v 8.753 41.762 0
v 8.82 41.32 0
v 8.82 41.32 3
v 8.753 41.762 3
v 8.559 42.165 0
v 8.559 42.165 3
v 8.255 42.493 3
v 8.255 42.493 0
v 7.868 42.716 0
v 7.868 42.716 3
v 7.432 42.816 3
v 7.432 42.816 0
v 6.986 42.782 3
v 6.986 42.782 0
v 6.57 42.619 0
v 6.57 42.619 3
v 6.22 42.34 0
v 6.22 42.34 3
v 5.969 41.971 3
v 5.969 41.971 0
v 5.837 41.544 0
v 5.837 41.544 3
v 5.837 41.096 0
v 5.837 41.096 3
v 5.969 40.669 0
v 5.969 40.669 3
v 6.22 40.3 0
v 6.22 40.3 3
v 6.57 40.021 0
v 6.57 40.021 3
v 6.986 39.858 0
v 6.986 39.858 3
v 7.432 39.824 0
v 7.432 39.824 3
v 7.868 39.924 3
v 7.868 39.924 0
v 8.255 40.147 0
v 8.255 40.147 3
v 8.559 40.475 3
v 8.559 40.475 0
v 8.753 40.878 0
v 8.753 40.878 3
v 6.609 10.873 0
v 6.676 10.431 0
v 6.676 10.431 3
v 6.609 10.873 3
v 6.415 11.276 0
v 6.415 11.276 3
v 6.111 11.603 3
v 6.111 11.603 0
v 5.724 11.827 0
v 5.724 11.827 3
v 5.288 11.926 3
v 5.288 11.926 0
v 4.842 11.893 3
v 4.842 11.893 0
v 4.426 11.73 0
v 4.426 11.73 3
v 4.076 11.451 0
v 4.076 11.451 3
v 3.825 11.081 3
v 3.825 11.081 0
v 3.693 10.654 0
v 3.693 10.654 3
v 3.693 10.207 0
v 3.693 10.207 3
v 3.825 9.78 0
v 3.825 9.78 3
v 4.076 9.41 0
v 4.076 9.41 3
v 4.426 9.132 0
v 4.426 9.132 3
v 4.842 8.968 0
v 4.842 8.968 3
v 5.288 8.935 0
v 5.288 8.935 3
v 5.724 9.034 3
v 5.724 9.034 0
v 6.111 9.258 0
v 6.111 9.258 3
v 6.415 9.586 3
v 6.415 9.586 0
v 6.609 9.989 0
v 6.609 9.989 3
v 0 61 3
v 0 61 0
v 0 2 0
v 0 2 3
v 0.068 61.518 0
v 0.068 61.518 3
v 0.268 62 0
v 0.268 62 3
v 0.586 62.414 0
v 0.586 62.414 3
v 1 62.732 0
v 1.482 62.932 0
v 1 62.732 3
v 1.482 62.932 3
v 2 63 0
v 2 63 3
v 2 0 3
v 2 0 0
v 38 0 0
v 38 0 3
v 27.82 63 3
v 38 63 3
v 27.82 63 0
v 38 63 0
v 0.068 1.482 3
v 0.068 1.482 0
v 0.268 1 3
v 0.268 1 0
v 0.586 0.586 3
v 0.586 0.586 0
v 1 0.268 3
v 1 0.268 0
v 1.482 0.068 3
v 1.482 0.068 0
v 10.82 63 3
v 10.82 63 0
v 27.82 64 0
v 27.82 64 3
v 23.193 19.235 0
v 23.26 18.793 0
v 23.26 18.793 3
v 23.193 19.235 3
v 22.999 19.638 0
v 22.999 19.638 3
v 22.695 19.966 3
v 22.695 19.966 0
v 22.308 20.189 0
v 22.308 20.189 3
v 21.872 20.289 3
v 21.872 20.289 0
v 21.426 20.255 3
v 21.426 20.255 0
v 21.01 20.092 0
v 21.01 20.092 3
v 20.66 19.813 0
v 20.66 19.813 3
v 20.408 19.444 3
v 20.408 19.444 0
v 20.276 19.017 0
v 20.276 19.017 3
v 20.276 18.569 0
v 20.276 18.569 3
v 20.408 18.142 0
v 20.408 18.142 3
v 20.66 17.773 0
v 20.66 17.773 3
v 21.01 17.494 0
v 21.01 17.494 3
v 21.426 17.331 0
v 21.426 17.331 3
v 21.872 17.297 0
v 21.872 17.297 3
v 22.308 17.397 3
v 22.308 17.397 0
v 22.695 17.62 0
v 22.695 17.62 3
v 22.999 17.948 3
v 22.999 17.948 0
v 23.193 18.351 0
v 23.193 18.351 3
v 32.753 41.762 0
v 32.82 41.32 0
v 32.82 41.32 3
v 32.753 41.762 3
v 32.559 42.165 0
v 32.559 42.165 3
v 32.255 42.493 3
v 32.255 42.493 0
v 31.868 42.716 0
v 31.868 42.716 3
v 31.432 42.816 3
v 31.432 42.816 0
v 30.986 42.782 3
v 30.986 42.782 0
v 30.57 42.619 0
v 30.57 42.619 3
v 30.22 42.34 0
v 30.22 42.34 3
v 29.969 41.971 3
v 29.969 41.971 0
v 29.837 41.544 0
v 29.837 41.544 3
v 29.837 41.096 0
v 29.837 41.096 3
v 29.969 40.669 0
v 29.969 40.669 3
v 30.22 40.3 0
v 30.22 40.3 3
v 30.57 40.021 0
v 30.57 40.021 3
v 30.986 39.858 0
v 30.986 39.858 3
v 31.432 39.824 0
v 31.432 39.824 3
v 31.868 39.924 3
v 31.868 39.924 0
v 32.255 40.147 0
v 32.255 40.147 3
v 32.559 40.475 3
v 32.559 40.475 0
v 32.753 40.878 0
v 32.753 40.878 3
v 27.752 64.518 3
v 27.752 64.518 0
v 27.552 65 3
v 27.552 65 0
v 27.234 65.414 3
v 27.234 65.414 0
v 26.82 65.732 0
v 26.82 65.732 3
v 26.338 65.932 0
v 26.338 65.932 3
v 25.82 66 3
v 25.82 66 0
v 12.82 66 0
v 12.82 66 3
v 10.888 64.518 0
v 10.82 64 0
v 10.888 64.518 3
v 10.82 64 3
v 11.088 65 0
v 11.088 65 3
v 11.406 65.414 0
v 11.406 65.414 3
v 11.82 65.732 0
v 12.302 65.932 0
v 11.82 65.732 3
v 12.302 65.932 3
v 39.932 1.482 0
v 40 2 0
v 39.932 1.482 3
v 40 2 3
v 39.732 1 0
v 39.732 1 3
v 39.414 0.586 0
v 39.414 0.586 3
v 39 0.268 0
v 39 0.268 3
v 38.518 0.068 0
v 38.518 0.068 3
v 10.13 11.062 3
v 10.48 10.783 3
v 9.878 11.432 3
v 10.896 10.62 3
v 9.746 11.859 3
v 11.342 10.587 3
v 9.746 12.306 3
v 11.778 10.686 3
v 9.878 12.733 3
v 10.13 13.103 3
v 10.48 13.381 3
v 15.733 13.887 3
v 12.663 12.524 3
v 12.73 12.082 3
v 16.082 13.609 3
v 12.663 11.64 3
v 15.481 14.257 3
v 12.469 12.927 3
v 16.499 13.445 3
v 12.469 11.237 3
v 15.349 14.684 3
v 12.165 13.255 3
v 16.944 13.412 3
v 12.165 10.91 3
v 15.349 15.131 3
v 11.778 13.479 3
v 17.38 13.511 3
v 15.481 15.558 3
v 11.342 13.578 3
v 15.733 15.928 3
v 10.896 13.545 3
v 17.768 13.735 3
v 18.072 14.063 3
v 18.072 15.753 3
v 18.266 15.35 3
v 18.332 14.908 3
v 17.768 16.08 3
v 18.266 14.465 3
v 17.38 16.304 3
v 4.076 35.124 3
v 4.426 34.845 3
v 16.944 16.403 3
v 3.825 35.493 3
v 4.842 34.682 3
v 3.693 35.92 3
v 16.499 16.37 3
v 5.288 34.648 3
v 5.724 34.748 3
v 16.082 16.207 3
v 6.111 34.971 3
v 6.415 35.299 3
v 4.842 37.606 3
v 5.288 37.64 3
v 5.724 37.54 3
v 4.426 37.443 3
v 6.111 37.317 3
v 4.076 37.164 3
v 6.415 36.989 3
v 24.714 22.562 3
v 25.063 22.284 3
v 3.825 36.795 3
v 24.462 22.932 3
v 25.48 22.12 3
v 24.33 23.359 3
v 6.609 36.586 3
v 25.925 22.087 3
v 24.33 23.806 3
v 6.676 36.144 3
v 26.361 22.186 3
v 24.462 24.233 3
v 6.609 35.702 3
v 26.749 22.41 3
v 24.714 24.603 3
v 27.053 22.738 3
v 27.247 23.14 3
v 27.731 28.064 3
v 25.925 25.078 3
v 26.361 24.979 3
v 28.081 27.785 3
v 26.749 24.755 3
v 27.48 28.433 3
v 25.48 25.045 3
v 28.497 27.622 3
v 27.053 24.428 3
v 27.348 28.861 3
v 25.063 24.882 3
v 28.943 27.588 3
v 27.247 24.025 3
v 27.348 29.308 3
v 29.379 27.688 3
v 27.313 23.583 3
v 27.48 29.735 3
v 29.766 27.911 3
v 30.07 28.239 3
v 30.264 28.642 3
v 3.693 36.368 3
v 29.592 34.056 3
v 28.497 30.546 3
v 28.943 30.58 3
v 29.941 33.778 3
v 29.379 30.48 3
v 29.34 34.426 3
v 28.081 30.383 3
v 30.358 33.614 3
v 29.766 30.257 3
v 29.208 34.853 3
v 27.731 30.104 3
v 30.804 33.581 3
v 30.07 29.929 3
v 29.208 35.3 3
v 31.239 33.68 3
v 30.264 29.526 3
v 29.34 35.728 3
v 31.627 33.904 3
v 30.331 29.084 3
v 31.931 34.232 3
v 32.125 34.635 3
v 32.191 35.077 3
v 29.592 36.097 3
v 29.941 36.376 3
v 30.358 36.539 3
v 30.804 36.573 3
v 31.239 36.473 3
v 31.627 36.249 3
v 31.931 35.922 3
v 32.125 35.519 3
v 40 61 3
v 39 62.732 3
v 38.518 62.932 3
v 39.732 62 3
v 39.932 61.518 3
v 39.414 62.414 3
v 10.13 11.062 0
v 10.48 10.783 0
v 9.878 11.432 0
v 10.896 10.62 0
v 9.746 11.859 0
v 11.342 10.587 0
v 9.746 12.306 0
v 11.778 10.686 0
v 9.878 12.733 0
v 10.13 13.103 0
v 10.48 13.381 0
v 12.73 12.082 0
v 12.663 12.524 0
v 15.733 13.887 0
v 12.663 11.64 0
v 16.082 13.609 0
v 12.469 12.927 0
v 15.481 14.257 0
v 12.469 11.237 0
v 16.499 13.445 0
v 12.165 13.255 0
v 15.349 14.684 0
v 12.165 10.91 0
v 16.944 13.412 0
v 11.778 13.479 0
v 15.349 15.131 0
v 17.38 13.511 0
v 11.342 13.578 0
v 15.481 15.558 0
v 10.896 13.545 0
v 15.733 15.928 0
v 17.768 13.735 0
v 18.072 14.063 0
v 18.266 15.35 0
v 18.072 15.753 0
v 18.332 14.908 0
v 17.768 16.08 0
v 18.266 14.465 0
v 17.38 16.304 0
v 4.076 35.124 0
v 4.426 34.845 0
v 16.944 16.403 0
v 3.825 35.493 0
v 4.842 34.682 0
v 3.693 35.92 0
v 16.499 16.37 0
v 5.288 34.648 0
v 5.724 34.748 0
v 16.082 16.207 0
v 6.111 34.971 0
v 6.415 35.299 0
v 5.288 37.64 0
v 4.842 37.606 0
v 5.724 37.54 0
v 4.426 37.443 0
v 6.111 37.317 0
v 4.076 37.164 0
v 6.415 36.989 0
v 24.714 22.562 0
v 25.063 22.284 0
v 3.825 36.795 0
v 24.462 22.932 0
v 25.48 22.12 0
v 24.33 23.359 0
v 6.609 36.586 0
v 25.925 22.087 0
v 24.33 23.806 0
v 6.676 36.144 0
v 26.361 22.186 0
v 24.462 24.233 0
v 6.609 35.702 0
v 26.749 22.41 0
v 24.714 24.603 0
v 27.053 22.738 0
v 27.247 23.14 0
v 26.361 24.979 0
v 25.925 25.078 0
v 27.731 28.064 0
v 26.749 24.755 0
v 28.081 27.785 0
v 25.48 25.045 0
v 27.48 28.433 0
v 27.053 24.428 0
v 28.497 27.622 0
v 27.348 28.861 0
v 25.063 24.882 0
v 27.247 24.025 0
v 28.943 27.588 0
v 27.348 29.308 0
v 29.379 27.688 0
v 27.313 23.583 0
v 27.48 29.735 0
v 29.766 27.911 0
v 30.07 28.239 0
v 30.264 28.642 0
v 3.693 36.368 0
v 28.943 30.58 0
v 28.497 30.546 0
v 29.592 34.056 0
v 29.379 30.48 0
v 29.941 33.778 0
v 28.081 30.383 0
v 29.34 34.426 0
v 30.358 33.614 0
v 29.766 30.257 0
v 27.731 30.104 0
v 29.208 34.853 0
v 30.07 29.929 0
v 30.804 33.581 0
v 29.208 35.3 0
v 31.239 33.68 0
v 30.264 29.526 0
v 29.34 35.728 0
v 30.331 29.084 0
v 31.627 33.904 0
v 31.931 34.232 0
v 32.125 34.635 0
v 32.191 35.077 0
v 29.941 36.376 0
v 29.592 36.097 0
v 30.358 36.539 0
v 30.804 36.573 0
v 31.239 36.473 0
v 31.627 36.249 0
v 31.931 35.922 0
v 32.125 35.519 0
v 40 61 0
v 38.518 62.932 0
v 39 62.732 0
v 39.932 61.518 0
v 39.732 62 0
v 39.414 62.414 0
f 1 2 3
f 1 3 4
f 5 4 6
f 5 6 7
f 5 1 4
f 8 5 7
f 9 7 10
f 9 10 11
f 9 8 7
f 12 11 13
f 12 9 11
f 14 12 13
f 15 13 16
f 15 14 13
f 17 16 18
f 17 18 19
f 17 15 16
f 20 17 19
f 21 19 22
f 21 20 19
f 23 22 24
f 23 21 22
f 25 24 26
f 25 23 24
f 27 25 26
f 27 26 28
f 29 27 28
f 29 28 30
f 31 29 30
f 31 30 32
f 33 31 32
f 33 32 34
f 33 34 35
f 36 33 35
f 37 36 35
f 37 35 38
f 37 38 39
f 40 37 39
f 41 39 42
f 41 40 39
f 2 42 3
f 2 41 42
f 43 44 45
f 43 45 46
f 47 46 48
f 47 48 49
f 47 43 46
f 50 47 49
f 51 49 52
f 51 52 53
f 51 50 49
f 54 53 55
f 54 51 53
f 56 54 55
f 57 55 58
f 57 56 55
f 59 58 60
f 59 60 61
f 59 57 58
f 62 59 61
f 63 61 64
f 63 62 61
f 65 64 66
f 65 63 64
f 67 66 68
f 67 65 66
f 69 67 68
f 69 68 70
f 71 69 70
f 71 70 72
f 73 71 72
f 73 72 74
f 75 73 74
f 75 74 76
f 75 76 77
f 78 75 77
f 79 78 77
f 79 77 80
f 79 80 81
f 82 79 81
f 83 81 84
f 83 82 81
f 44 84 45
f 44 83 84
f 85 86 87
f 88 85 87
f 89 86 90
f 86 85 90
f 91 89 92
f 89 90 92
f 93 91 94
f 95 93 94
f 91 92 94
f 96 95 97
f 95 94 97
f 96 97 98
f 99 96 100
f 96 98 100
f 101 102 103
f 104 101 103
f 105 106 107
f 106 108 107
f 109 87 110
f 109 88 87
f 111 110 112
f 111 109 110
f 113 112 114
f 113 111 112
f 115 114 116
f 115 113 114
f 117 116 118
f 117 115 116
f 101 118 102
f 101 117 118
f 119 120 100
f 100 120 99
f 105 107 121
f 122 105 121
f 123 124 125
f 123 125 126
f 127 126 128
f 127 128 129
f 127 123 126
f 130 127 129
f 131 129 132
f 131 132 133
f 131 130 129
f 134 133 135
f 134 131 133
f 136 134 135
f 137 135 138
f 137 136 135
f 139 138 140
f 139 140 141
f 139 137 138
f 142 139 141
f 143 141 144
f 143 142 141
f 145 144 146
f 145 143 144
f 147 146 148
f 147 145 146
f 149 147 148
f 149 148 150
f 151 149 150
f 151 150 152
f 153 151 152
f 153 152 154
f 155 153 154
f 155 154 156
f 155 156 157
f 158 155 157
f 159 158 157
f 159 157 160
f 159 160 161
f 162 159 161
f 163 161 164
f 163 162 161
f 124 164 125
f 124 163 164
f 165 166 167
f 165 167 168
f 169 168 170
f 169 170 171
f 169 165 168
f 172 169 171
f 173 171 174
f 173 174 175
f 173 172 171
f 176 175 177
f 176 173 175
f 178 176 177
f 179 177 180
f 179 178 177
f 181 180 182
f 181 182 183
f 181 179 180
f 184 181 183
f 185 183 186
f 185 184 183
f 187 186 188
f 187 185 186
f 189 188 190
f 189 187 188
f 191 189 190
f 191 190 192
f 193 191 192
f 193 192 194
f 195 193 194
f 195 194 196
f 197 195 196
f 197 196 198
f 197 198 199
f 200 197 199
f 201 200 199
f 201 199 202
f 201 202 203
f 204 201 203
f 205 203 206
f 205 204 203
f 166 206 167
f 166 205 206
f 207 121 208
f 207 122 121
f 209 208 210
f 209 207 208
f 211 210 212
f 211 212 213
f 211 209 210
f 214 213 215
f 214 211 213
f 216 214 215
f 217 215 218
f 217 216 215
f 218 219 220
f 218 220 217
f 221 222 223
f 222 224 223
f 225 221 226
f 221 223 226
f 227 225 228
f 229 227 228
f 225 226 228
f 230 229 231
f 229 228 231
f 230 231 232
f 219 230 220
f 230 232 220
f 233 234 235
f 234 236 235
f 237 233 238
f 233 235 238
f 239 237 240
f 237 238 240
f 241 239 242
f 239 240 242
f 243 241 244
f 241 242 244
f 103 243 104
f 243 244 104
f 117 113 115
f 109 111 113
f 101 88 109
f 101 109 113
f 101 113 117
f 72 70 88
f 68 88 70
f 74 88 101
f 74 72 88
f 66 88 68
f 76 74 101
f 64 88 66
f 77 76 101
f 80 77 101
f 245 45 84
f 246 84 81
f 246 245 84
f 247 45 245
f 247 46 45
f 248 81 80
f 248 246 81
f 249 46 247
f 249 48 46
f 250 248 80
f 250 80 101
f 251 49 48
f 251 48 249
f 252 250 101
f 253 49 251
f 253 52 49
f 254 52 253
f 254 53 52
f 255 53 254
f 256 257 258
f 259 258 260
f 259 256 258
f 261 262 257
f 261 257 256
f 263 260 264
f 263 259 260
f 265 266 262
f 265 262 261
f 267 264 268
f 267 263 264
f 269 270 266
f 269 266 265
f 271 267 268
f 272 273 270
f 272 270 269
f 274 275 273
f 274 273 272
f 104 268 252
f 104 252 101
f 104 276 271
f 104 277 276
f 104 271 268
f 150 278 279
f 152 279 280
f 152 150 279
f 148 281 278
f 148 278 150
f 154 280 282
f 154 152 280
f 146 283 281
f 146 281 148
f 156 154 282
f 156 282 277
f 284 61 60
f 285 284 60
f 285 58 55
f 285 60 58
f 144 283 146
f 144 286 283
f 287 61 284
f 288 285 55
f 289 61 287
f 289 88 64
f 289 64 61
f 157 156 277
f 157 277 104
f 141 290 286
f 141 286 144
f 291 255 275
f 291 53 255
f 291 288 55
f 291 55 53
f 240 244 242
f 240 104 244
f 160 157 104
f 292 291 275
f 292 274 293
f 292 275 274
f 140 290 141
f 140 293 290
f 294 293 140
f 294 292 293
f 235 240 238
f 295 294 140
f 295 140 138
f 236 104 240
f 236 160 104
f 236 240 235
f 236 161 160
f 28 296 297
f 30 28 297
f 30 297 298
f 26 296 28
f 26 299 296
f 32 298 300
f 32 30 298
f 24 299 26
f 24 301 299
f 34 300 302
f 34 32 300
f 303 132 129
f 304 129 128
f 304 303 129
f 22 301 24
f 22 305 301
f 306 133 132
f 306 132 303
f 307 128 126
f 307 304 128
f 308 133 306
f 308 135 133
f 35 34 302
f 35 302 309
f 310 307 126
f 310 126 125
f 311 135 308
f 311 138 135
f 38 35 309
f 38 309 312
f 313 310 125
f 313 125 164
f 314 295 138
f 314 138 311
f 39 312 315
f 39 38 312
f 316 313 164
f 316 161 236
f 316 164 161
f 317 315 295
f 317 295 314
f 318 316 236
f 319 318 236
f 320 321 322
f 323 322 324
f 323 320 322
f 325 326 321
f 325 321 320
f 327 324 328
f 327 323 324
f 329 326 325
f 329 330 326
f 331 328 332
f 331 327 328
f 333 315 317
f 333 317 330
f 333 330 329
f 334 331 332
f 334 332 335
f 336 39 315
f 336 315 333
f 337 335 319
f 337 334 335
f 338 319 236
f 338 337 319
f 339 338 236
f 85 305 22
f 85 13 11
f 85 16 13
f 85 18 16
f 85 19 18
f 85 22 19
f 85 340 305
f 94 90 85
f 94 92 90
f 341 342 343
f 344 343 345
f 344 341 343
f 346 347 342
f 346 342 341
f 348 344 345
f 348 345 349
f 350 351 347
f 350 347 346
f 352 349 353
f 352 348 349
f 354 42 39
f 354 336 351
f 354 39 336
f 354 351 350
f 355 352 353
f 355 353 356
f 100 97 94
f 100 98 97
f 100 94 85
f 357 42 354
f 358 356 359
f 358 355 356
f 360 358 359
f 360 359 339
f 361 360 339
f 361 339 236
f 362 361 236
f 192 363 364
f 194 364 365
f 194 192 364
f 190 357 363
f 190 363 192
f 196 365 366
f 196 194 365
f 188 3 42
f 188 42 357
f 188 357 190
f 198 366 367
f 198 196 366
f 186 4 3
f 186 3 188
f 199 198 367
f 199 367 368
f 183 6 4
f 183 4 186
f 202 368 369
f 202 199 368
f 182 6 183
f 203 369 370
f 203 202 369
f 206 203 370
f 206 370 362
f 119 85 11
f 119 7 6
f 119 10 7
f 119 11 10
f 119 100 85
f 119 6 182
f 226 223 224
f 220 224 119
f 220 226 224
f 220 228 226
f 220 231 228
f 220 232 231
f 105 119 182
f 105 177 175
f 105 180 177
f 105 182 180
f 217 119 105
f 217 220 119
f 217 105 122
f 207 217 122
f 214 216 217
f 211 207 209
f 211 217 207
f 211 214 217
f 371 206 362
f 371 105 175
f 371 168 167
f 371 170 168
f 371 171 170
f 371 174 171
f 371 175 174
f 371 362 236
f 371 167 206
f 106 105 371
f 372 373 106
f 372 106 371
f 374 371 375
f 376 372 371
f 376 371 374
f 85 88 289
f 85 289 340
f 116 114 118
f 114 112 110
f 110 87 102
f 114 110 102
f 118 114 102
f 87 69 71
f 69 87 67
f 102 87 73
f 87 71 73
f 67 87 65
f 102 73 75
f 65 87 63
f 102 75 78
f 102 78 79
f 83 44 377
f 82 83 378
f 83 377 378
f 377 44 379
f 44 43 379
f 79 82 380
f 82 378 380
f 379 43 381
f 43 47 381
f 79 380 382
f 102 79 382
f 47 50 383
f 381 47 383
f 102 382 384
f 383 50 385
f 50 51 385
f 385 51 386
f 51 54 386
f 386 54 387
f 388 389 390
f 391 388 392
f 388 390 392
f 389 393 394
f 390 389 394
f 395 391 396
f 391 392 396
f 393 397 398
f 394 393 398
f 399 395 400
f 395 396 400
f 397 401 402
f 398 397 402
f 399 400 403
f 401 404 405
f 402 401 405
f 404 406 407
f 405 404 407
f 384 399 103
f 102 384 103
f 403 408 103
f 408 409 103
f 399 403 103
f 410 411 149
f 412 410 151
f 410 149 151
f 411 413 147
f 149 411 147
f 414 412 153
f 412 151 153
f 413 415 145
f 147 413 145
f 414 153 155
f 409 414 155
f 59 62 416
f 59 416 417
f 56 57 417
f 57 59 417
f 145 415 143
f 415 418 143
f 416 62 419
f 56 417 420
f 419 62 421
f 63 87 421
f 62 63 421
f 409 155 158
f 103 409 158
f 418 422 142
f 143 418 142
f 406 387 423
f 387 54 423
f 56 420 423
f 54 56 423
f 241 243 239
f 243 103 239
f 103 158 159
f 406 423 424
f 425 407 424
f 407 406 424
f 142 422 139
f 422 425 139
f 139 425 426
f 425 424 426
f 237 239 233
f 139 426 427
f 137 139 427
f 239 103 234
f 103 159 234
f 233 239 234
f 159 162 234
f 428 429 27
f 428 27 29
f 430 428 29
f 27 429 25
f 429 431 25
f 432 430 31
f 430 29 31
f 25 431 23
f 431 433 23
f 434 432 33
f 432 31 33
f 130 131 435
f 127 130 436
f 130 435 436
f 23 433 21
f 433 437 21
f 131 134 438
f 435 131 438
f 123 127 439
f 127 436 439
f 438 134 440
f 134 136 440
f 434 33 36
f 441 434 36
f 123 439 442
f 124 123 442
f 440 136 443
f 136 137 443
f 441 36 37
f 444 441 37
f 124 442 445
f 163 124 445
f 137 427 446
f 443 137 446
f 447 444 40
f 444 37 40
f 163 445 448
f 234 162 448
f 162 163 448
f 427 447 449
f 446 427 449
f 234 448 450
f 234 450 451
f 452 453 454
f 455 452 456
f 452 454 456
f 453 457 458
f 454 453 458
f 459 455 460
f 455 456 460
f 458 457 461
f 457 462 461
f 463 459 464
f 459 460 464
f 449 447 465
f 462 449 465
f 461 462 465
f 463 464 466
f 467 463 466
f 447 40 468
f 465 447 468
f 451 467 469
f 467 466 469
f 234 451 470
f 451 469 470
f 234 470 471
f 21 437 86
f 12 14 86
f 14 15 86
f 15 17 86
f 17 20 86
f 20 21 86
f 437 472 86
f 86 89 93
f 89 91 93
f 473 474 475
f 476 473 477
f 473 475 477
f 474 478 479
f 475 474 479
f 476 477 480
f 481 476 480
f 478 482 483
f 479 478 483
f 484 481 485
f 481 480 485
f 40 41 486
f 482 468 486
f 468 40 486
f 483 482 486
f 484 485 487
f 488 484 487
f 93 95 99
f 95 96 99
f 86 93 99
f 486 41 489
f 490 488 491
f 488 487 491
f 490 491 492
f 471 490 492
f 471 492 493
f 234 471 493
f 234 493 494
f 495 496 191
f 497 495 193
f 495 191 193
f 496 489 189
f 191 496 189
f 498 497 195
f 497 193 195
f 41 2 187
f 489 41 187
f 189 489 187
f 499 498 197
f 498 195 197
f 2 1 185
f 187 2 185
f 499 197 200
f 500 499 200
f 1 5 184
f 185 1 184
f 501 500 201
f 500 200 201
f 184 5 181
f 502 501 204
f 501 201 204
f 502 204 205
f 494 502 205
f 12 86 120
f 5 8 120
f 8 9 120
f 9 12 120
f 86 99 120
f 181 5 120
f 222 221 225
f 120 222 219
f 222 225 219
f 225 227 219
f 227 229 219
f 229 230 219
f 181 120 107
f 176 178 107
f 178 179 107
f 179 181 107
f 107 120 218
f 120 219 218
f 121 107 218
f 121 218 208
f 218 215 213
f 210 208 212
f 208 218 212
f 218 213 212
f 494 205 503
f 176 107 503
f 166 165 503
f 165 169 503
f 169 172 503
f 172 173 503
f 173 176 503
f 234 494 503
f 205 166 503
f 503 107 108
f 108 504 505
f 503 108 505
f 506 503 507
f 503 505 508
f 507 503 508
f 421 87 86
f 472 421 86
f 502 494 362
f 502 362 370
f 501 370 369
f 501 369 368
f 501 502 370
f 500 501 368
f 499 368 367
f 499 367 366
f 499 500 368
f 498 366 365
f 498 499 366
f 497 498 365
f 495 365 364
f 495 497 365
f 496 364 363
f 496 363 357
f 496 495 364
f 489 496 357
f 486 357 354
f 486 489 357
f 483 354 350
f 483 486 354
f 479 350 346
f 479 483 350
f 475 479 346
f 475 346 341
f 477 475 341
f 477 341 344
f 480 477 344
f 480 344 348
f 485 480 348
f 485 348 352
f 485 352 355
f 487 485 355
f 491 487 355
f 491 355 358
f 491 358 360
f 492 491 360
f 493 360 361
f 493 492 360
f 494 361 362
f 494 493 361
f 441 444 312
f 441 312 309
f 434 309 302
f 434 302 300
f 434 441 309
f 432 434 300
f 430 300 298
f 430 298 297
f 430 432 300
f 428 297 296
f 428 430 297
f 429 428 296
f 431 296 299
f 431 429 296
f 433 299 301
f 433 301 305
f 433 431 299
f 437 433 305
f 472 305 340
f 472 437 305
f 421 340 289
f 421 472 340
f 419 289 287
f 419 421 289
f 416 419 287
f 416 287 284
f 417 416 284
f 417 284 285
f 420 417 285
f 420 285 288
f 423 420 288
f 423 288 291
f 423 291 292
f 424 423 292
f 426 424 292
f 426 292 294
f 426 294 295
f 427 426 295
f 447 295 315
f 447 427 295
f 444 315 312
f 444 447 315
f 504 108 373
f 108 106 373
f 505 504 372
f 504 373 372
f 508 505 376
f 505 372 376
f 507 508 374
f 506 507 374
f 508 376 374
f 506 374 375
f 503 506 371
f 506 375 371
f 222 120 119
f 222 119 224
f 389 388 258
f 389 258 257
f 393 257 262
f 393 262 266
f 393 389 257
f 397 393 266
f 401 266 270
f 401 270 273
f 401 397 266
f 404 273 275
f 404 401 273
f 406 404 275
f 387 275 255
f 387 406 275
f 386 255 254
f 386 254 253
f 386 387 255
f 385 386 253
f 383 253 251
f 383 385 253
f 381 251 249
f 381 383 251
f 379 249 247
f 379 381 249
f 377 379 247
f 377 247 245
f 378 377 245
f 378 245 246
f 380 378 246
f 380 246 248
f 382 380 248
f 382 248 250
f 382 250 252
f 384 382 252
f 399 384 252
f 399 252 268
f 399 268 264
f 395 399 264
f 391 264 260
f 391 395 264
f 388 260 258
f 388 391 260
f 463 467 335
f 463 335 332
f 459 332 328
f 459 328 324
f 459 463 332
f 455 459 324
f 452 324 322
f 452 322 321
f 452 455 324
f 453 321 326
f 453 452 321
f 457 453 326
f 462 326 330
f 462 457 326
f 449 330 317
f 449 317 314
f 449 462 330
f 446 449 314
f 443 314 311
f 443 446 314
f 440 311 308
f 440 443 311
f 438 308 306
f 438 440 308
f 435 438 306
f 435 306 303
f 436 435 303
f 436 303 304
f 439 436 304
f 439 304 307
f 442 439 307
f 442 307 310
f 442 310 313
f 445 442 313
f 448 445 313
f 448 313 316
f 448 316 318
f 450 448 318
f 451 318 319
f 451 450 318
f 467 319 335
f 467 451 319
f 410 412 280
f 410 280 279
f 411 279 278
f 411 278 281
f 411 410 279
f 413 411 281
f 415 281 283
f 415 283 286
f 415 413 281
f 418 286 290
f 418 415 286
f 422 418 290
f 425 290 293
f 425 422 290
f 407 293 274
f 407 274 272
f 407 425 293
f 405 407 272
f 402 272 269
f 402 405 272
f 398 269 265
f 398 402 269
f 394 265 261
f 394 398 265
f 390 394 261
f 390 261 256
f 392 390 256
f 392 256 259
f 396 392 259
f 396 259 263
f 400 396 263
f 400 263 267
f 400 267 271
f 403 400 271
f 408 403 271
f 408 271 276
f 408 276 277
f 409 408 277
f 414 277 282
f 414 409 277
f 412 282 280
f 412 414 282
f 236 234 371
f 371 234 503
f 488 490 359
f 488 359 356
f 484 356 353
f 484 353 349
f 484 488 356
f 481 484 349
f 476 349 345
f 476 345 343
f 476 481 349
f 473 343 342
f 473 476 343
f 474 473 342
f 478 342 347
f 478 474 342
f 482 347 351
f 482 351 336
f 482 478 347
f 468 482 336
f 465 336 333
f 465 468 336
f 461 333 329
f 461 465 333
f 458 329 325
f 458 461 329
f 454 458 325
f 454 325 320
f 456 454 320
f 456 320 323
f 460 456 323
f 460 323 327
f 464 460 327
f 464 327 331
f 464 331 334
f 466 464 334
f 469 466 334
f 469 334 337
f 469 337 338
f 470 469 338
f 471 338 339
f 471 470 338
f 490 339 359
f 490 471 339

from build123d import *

# Parameters (mm, degrees)
SKETCH_1_R      = 1.5
SKETCH_1_W      = 17
SKETCH_1_H      = 3
EXTRUDE_1_DEPTH = 3
FILLET_1_R      = 2
FILLET_2_R      = 2


with BuildPart() as part:
    # 草图1 → 凸台-拉伸1 (new body)
    # profile 1 of 5: a face of its own
    with BuildSketch(Plane.XY):
        with BuildLine():
            Line((0, 10), (0, 7))
            ThreePointArc((0, 7), (24.26790473, 17.05209527), (34.32, 41.32))
            Line((34.32, 41.32), (34.32, 63))
            Line((34.32, 63), (4.32, 63))
            Line((4.32, 63), (4.32, 41.32))
            ThreePointArc((4.32, 41.32), (3.054701295, 38.265298705), (0, 37))
            Line((0, 37), (0, 34))
            Line((0, 34), (0, 22))
            Line((0, 22), (0, 10))
        make_face()
        with Locations((5.176021638, 10.430662034)):
            Circle(SKETCH_1_R, mode=Mode.SUBTRACT)
        with Locations((11.229544899, 12.082357801)):
            Circle(SKETCH_1_R, mode=Mode.SUBTRACT)
        with Locations((16.832334664, 14.907599318)):
            Circle(SKETCH_1_R, mode=Mode.SUBTRACT)
        with Locations((21.759505147, 18.792986533)):
            Circle(SKETCH_1_R, mode=Mode.SUBTRACT)
        with Locations((25.813288692, 23.582567072)):
            Circle(SKETCH_1_R, mode=Mode.SUBTRACT)
        with Locations((28.830973806, 29.08409589)):
            Circle(SKETCH_1_R, mode=Mode.SUBTRACT)
        with Locations((30.691436099, 35.076751631)):
            Circle(SKETCH_1_R, mode=Mode.SUBTRACT)
        with Locations((31.32, 41.32)):
            Circle(SKETCH_1_R, mode=Mode.SUBTRACT)
        with Locations((7.32, 41.32)):
            Circle(SKETCH_1_R, mode=Mode.SUBTRACT)
        with Locations((5.176021638, 36.143978362)):
            Circle(SKETCH_1_R, mode=Mode.SUBTRACT)
    # profile 2 of 5: a face of its own
    with BuildSketch(Plane.XY):
        with BuildLine():
            Line((0, 41.32), (0, 37))
            ThreePointArc((0, 37), (3.054701295, 38.265298705), (4.32, 41.32))
            Line((4.32, 41.32), (4.32, 63))
            Line((4.32, 63), (0, 63))
            Line((0, 63), (0, 41.32))
        make_face()
    # profile 3 of 5: a face of its own
    with BuildSketch(Plane.XY):
        with BuildLine():
            ThreePointArc((0, 7), (24.26790473, 17.05209527), (34.32, 41.32))
            Line((34.32, 41.32), (34.32, 63))
            Line((34.32, 63), (40, 63))
            Line((40, 63), (40, 0))
            Line((40, 0), (0, 0))
            Line((0, 0), (0, 7))
        make_face()
    # profile 4 of 5: a face of its own
    with BuildSketch(Plane.XY):
        with Locations((19.32, 64.5)):
            Rectangle(SKETCH_1_W, SKETCH_1_H)
    # profile 5 of 5: a face of its own
    with BuildSketch(Plane.XY):
        with BuildLine():
            ThreePointArc((34.32, 41.32), (24.26790473, 17.05209527), (0, 7))
            Line((0, 7), (0, 0))
            Line((0, 0), (40, 0))
            Line((40, 0), (40, 63))
            Line((40, 63), (34.32, 63))
            Line((34.32, 63), (34.32, 41.32))
        make_face()
    extrude(amount=EXTRUDE_1_DEPTH)

    # 圆角1
    fillet_1_edges = [part.edges().sort_by_distance(p)[0] for p in [
        (40, 63, 1.5),
        (40, 0, 1.5),
        (0, 0, 1.5),
        (0, 63, 1.5),
    ]]
    fillet(fillet_1_edges, radius=FILLET_1_R)

    # 圆角2
    fillet_2_edges = [part.edges().sort_by_distance(p)[0] for p in [
        (10.82, 66, 1.5),
        (27.82, 66, 1.5),
    ]]
    fillet(fillet_2_edges, radius=FILLET_2_R)


solid = part.part
